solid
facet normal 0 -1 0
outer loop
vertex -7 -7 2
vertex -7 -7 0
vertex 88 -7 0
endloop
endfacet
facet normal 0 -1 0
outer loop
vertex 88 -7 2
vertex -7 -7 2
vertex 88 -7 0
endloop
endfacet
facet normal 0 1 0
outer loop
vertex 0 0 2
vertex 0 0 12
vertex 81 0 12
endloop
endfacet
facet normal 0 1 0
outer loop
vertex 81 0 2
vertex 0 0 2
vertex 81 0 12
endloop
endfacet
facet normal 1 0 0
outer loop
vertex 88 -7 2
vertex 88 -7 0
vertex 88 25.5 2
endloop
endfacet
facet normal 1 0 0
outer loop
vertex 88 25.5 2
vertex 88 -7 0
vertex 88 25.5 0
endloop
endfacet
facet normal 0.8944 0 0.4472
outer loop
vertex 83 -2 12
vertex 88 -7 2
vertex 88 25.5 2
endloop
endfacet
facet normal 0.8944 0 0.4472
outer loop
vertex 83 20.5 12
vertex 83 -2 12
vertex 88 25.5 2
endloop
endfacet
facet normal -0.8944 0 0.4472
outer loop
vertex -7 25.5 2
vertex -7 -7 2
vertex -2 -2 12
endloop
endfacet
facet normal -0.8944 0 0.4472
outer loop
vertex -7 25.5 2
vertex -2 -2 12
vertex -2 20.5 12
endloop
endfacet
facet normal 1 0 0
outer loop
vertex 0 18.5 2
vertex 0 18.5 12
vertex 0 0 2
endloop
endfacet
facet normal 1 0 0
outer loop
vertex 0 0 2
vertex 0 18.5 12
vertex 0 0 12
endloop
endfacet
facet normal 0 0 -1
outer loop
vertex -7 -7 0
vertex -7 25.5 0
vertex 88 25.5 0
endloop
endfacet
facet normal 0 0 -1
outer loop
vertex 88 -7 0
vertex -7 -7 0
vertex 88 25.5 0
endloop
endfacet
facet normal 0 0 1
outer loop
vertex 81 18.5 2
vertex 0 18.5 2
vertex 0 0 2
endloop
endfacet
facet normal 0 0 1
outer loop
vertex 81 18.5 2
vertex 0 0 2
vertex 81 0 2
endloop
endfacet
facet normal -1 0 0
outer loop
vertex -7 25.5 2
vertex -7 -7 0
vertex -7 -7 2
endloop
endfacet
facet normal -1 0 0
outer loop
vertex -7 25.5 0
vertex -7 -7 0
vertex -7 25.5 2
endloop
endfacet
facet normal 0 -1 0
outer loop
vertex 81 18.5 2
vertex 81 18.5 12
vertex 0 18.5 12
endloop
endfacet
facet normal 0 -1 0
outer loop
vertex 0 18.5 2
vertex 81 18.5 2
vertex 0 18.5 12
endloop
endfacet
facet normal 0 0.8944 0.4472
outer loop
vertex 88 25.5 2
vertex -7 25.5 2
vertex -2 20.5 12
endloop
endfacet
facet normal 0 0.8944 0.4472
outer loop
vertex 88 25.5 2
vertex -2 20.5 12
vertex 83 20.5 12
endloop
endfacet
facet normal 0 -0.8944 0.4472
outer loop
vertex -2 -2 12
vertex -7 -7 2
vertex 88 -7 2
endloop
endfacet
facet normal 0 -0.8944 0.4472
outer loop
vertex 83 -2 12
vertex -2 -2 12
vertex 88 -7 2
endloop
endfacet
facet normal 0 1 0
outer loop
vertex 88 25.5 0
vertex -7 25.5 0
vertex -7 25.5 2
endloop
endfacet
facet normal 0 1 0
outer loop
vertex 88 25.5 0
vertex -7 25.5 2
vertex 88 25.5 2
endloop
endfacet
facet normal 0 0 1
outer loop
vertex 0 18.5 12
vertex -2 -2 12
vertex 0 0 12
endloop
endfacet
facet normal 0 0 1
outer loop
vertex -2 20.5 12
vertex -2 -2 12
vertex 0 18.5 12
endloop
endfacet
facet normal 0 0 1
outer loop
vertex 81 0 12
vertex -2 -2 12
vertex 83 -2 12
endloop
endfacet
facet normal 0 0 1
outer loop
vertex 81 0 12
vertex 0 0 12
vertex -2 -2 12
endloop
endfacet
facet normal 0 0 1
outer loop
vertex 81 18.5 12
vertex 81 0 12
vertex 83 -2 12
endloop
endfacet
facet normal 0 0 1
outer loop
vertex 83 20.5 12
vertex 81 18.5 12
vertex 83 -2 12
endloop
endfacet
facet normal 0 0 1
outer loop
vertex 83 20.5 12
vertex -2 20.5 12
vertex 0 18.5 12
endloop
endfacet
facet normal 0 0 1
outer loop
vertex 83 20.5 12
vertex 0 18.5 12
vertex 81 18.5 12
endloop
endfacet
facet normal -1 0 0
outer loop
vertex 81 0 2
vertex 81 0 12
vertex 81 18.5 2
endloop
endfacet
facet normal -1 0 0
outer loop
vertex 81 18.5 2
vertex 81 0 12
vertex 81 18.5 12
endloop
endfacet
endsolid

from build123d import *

# Parameters (mm, degrees)
F0_W     = 95
F0_H     = 32.5
F1_DEPTH = 12
F3_DEPTH = 10
F4_SIZE2 = 10
F4_SIZE  = 5


with BuildPart() as f1:
    # F0 (on Top) → F1 (new body)
    with BuildSketch(Plane.XY):
        with Locations((40.5, 9.25)):
            Rectangle(F0_W, F0_H)
    extrude(amount=F1_DEPTH)

    # F2 (on face) → F3 (cut)
    with BuildSketch(Plane.XY.offset(12)):
        Polygon((0, 18.5), (0, 0), (4.9286105492, 0), (81, 0), (81, 18.5), align=None)
    extrude(amount=-F3_DEPTH, mode=Mode.SUBTRACT)

    # F4
    f4_edges = [f1.edges().sort_by_distance(p)[0] for p in [
        (40.5, 25.5, 12),
        (88, 9.25, 12),
        (40.5, -7, 12),
        (-7, 9.25, 12),
    ]]
    f4_side = f1.faces().sort_by_distance((40.5, 24.495946, 12))[0]
    chamfer(f4_edges, length=F4_SIZE, length2=F4_SIZE2, reference=f4_side)


solid = f1.part
